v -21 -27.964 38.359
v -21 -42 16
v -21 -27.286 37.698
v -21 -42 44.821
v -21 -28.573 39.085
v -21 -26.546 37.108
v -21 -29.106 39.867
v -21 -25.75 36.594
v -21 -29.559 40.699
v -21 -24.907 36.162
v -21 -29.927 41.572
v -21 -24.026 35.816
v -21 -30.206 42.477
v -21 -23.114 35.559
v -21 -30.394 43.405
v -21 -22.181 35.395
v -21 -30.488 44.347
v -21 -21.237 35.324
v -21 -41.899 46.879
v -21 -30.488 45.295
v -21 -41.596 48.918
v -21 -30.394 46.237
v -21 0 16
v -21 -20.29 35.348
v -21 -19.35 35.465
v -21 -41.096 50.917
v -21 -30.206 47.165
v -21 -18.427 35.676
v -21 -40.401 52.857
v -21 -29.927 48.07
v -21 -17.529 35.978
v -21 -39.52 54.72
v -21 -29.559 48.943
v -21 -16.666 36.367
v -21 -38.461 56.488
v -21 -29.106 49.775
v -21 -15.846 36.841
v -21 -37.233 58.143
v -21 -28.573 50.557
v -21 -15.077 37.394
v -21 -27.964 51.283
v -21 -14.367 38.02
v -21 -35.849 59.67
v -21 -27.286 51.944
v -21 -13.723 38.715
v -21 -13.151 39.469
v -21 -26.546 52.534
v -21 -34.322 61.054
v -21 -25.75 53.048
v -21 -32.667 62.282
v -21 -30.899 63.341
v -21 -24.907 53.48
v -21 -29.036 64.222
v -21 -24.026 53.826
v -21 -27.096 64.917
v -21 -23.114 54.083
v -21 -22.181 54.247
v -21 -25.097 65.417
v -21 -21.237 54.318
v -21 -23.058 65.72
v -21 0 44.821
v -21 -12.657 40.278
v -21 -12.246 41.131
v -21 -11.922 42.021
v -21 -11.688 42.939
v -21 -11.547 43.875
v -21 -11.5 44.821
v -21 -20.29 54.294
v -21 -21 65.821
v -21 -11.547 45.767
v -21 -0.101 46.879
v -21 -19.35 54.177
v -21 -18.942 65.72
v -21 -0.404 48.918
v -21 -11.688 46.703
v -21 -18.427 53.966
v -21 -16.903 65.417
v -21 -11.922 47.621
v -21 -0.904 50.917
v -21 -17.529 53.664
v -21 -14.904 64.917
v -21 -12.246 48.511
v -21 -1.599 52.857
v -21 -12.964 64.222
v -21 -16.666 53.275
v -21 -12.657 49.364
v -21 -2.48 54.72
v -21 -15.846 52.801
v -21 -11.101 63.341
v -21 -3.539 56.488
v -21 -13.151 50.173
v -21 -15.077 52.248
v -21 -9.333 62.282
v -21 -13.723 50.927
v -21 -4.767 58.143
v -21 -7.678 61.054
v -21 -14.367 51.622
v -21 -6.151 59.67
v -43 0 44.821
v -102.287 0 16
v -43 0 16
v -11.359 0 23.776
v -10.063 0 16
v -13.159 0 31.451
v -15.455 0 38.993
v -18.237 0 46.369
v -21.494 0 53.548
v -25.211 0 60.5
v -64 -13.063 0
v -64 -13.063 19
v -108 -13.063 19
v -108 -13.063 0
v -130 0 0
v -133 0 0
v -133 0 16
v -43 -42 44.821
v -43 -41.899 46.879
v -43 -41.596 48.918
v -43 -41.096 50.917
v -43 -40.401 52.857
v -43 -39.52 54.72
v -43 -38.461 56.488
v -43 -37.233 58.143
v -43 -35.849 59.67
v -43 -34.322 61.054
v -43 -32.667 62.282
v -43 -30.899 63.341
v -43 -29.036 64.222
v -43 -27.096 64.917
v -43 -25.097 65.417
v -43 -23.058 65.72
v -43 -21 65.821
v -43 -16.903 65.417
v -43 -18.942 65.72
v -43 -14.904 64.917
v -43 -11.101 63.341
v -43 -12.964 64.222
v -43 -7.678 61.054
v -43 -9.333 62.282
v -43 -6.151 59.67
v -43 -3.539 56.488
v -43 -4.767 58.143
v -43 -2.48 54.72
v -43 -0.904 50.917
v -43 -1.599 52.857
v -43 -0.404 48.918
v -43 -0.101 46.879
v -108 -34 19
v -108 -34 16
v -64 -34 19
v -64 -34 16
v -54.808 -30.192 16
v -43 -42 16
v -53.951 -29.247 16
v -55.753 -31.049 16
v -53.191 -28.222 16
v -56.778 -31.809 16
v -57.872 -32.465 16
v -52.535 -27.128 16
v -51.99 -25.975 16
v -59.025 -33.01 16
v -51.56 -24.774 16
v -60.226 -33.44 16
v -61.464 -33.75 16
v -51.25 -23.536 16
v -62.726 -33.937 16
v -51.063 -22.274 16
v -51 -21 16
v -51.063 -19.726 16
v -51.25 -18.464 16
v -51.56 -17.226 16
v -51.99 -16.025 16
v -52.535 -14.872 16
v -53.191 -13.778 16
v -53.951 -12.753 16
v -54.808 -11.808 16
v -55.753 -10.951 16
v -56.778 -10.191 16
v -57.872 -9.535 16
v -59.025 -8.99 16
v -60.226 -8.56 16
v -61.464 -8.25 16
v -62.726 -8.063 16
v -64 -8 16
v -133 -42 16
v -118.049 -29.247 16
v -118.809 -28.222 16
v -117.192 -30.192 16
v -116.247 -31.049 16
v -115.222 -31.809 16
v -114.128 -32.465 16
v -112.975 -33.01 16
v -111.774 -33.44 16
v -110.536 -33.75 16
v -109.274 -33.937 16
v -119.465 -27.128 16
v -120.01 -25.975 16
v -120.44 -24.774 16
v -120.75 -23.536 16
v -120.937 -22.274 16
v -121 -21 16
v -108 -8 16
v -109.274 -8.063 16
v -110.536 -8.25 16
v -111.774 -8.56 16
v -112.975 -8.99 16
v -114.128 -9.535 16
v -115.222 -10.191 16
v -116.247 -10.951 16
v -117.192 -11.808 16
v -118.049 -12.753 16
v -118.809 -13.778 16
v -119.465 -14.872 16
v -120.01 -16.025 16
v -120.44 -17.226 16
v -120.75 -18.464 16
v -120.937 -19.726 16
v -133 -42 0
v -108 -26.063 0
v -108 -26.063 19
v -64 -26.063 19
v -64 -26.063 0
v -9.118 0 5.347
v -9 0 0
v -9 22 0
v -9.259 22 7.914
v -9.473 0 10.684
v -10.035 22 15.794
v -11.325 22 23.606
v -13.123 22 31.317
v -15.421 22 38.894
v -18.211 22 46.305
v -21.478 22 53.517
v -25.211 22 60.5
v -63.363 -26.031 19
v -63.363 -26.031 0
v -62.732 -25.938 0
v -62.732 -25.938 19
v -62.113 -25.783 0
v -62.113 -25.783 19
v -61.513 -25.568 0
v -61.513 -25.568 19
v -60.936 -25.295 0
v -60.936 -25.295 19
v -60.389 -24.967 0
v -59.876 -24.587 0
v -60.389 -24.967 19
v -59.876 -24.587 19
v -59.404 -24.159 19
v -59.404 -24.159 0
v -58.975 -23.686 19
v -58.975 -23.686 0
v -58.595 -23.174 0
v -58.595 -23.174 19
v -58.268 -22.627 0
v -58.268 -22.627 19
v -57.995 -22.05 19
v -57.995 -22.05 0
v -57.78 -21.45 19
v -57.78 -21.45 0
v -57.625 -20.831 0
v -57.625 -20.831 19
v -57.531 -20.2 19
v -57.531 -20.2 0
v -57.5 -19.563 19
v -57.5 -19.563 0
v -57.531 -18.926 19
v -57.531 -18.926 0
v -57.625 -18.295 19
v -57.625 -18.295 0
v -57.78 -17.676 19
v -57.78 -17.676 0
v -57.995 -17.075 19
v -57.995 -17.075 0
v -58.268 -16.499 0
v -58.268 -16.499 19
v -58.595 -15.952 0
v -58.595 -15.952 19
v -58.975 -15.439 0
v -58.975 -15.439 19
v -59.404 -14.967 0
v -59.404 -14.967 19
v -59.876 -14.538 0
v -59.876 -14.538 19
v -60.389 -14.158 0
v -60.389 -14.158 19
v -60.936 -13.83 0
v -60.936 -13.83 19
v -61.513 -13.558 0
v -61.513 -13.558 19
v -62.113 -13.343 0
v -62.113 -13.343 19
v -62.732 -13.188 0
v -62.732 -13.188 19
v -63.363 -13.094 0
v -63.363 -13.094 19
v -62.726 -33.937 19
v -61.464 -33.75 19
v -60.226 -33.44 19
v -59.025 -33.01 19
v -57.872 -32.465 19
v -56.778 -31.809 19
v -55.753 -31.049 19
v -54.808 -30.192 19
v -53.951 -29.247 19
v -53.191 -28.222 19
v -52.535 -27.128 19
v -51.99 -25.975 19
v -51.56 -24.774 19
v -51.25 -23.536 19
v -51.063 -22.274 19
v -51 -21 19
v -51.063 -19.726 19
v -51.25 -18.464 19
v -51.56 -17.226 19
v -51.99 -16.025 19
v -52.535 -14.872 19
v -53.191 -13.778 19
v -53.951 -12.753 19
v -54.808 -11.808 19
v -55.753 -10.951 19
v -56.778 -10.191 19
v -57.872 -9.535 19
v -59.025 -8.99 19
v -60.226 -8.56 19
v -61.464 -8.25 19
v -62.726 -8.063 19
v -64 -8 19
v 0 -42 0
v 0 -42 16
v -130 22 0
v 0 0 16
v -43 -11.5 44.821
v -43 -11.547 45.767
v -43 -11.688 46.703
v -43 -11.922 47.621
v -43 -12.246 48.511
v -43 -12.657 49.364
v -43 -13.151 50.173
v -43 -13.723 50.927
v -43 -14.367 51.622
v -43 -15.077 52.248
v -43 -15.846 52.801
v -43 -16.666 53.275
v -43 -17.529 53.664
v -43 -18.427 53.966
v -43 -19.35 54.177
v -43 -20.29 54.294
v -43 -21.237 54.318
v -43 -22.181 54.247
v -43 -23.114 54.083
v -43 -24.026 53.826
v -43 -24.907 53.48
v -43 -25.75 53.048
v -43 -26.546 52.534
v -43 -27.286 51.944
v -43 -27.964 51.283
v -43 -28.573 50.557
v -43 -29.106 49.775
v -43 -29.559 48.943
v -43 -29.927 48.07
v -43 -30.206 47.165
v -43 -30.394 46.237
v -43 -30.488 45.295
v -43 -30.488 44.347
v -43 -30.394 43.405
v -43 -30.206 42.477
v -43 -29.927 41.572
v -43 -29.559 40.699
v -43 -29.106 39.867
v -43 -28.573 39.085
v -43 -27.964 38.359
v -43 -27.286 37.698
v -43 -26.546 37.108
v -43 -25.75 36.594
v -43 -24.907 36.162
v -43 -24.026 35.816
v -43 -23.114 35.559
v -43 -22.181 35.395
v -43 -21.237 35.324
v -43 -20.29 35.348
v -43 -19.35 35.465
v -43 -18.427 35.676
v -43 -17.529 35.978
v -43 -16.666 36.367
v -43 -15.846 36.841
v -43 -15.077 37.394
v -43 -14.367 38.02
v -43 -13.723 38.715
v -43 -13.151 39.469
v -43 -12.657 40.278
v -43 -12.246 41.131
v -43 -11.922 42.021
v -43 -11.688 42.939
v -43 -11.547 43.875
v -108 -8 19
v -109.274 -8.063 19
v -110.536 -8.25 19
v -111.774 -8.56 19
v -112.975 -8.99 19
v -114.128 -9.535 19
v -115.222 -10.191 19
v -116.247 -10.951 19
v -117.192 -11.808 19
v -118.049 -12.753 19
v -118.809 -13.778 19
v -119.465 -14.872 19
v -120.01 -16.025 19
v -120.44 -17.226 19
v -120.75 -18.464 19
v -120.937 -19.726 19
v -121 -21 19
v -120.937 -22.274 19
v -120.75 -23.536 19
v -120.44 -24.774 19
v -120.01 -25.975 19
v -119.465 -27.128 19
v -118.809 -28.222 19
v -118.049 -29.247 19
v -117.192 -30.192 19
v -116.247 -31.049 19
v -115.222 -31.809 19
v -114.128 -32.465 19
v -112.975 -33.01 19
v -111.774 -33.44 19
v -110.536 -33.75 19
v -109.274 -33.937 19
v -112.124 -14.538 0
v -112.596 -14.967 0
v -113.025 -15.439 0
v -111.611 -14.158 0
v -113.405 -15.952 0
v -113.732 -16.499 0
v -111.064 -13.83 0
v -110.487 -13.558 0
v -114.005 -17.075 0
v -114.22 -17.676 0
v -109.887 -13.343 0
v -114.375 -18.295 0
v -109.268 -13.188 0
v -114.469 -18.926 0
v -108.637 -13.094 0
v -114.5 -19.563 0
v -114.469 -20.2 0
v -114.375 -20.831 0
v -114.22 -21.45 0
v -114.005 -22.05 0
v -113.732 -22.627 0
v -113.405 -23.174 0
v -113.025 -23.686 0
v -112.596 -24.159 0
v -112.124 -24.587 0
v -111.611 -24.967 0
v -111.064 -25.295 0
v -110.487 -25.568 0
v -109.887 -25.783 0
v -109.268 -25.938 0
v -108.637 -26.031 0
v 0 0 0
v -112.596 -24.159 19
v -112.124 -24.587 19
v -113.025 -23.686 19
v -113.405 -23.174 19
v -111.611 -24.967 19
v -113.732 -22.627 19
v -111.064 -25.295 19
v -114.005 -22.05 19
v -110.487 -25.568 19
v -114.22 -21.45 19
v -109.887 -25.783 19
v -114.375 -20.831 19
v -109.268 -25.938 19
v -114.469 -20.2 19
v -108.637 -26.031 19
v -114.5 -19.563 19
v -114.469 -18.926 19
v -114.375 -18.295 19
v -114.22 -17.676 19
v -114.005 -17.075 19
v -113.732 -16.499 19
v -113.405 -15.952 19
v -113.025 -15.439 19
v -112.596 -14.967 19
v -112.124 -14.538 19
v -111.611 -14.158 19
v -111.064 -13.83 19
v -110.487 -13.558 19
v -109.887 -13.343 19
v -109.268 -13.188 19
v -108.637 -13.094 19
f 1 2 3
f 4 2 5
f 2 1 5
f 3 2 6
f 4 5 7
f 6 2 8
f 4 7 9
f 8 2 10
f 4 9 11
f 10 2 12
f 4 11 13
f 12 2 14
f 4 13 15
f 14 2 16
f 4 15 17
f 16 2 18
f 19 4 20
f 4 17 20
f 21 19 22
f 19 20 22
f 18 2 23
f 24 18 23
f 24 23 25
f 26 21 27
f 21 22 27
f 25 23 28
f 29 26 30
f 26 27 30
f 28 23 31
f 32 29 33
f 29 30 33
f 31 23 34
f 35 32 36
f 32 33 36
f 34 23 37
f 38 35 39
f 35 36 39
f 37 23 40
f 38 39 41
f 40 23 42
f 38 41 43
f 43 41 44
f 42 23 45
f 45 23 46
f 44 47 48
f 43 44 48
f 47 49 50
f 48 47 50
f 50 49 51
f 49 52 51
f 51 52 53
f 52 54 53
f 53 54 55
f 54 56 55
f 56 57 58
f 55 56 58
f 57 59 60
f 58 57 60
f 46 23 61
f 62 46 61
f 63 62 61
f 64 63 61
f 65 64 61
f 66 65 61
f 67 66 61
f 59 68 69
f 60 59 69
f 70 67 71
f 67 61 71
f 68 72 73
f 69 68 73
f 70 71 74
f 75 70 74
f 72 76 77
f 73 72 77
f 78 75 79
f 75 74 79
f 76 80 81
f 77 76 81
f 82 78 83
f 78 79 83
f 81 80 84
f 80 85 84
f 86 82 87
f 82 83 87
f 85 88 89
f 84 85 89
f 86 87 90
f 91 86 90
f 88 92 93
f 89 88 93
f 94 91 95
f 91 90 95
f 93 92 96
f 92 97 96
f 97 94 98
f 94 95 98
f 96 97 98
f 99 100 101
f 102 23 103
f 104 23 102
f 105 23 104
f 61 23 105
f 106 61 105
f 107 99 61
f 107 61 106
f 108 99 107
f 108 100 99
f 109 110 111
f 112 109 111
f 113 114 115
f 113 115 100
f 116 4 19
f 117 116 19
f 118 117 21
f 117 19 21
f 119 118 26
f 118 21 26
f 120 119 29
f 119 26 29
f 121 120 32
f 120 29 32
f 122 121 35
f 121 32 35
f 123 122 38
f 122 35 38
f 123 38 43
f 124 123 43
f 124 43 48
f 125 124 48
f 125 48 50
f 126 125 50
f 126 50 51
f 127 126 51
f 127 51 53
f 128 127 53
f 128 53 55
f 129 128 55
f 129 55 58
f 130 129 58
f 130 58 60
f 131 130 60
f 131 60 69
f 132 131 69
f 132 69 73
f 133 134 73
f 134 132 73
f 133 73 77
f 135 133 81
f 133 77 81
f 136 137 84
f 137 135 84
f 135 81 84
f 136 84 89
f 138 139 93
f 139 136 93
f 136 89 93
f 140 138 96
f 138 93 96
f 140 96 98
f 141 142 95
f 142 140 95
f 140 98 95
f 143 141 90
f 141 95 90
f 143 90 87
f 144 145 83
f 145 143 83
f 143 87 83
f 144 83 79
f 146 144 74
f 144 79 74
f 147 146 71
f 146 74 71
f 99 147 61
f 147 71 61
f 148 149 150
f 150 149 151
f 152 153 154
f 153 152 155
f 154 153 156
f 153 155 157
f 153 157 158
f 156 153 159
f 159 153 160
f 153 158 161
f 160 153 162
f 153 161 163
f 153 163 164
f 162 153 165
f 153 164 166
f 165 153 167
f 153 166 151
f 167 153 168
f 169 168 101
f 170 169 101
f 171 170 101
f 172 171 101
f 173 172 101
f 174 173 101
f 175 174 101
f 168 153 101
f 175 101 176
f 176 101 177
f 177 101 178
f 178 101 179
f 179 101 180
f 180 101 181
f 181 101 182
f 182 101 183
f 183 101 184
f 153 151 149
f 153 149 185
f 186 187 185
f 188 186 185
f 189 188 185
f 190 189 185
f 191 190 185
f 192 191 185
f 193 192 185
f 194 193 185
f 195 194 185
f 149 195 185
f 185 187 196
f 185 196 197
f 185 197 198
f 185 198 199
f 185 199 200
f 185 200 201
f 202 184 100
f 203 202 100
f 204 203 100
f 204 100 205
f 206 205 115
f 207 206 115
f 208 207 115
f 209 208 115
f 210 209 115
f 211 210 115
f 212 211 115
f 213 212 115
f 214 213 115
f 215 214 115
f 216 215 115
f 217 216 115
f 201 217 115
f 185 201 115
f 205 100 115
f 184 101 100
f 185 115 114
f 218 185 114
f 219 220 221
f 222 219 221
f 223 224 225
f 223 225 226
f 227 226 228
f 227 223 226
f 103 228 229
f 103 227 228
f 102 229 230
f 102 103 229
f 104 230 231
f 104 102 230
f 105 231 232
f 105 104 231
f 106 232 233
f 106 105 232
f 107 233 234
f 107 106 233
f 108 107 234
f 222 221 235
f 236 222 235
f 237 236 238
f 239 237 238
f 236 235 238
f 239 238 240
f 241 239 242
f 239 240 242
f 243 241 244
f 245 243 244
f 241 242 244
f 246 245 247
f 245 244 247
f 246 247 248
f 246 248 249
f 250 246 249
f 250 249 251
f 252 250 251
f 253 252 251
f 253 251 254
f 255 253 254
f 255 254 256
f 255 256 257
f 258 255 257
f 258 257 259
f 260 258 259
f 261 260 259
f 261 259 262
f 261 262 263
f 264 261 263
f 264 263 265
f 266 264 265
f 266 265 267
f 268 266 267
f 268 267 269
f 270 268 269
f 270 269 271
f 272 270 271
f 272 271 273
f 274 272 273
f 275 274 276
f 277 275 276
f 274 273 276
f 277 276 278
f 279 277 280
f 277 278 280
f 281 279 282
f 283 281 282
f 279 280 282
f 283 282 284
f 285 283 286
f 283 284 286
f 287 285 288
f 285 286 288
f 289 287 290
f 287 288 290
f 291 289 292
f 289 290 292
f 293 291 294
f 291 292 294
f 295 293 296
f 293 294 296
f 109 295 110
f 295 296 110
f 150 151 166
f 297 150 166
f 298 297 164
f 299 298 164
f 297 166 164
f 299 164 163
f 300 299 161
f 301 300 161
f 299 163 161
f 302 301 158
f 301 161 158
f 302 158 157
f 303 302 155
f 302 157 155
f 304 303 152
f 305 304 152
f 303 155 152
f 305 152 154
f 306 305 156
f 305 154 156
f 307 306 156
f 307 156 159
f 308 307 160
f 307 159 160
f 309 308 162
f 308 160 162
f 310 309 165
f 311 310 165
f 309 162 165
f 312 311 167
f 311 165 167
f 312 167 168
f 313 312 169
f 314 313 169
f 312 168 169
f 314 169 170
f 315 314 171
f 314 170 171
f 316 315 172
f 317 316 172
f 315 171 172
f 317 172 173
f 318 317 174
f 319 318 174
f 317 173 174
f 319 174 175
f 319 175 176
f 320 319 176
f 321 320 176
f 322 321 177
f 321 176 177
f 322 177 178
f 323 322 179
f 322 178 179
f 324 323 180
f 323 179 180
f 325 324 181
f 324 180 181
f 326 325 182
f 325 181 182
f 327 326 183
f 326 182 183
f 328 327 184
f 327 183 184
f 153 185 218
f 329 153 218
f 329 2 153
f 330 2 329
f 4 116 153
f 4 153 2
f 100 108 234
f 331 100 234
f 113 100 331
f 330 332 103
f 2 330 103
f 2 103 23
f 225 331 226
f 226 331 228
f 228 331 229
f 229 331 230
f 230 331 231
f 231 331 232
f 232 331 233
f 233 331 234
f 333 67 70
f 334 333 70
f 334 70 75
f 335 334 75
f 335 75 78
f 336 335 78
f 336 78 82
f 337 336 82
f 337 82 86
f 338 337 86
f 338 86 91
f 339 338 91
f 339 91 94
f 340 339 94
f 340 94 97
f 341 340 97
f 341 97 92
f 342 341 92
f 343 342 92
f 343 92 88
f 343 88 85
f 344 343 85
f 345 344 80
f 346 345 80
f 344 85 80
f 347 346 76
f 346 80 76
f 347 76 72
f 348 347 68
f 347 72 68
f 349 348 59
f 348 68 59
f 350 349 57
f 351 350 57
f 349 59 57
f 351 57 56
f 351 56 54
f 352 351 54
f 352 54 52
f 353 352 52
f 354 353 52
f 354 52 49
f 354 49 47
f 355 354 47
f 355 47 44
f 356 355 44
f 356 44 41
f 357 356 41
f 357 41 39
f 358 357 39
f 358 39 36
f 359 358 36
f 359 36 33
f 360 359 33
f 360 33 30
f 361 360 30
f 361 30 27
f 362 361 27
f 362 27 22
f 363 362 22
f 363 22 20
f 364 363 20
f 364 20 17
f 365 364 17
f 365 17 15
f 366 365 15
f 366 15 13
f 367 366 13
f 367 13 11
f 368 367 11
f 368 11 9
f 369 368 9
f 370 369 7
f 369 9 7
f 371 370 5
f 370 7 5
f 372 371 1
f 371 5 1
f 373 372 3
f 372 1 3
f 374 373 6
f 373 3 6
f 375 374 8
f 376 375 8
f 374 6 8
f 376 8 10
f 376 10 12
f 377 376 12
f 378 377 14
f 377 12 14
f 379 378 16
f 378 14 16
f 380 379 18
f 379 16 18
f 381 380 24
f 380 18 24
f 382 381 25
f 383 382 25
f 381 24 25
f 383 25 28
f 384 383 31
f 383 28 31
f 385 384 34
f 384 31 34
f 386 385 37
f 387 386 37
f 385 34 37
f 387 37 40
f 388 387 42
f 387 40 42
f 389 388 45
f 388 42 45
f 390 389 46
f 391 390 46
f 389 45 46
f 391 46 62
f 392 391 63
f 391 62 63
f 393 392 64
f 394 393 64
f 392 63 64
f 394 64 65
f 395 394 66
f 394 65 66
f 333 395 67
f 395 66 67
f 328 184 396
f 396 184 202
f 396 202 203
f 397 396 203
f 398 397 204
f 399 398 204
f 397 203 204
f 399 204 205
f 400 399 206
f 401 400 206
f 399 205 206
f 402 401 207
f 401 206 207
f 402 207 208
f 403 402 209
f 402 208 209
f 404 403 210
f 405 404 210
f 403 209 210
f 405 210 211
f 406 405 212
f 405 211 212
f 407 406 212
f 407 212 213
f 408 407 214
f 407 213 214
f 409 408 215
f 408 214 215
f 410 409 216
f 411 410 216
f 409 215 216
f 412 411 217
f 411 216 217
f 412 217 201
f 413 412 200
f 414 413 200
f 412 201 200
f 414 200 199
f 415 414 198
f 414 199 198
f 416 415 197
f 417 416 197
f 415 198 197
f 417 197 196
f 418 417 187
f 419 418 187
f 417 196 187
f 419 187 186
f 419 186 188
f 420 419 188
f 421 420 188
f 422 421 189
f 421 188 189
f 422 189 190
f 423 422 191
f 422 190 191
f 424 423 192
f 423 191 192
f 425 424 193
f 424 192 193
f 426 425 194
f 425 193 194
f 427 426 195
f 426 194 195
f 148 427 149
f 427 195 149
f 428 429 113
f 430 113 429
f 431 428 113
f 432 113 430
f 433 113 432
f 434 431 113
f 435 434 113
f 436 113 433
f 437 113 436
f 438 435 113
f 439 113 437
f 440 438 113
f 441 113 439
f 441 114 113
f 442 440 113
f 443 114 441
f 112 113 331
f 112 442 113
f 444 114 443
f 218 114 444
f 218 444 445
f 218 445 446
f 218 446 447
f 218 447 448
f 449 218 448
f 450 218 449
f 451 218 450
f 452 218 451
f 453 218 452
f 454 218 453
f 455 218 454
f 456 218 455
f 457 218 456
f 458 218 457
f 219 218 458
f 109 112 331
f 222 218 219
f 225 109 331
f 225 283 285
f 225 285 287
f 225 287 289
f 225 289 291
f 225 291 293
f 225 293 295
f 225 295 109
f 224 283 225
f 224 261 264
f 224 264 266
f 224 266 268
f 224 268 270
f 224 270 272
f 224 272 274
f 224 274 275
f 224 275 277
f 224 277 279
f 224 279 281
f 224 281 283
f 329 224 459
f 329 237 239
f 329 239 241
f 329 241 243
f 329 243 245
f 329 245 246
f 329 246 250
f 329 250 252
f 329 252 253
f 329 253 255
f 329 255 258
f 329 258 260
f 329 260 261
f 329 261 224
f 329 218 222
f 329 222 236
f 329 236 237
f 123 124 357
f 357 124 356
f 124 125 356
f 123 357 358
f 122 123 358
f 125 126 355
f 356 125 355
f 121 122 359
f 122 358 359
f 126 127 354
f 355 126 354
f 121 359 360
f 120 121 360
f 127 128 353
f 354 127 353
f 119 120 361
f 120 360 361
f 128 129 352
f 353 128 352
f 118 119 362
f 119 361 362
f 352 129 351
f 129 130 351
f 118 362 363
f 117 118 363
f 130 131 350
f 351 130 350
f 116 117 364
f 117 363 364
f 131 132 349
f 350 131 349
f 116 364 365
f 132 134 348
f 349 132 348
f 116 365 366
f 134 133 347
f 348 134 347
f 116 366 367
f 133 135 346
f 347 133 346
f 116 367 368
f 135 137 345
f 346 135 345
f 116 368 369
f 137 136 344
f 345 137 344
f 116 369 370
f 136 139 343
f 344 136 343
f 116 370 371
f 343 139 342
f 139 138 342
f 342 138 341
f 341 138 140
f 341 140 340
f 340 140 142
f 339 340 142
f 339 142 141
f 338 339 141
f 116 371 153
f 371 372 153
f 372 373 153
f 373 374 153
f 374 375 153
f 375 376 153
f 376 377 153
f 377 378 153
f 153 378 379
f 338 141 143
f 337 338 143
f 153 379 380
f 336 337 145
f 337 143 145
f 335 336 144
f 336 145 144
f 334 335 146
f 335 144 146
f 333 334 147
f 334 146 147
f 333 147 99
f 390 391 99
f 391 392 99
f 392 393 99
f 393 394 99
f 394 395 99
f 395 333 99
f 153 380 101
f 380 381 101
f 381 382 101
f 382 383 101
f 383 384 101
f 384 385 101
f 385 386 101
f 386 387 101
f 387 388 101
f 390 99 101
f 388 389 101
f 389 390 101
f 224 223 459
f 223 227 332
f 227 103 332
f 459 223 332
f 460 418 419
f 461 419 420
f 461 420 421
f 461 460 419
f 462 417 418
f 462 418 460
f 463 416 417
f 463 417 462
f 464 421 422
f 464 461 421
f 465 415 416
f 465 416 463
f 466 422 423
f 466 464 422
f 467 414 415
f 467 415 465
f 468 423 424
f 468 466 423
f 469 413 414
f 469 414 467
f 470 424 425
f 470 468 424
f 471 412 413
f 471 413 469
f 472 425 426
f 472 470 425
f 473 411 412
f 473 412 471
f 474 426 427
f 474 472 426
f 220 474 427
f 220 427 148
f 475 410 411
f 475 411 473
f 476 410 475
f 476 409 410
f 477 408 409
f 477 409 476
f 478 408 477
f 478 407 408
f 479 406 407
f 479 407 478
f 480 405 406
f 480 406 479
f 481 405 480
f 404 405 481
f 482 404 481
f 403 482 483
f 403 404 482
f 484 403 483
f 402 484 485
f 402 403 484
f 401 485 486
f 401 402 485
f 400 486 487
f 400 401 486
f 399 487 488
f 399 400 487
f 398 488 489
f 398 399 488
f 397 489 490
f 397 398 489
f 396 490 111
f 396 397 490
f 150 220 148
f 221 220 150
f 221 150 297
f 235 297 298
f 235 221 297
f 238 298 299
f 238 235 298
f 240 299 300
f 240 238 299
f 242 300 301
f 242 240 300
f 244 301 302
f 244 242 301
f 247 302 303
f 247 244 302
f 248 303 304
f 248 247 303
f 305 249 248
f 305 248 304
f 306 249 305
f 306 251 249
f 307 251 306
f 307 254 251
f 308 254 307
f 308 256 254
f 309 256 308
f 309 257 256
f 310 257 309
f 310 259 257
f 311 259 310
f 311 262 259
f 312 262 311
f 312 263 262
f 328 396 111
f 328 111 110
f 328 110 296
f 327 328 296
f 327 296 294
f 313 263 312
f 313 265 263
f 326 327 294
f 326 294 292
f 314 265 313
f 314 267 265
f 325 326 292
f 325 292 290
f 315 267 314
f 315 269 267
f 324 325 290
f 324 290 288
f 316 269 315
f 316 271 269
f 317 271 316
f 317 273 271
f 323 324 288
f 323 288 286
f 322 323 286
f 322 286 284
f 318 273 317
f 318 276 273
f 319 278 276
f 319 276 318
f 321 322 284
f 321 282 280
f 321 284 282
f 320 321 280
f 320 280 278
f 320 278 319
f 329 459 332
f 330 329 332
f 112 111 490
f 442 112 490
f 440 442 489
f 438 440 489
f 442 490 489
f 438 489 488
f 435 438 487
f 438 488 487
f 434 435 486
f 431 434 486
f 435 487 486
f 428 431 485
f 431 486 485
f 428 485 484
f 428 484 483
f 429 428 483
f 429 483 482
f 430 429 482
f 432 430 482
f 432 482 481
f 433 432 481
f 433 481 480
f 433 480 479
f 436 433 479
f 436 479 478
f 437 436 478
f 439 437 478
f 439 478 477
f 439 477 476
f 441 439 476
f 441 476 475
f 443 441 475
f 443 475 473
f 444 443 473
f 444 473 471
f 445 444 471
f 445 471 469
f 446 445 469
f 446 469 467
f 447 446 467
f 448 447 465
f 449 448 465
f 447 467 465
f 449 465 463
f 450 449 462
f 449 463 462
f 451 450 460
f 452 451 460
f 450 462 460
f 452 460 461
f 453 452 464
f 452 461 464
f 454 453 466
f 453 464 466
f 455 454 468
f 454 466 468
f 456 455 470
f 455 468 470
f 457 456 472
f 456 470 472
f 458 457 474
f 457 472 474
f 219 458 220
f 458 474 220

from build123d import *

# Parameters (mm, degrees)
F1_DEPTH  = 42
F3_DEPTH  = 112.001
F2_R      = 9.5
F4_DEPTH  = 112.001
F6_DEPTH  = 3
F8_DEPTH  = 22
F10_DEPTH = 19.001


with BuildPart() as f1:
    # F0 (on Front) → F1 (new body)
    with BuildSketch(Plane.XZ):
        Polygon((-133, 0), (0, 0), (0, 16), (-21, 16), (-21, 66), (-43, 66), (-43, 16), (-133, 16), align=None)
    extrude(amount=F1_DEPTH)

    # F2 (on face) → F3 (cut, through all)
    with BuildSketch(Plane.YZ.offset(-21)):
        with BuildLine():
            Line((-42, 66), (-42, 44.820994))
            ThreePointArc((-42, 44.820994), (-21, 65.820994), (0, 44.820994))
            Line((0, 44.820994), (0, 66))
            Line((0, 66), (-42, 66))
        make_face()
    extrude(amount=-F3_DEPTH, mode=Mode.SUBTRACT)

    # F2 (on face) → F4 (cut, through all)
    with BuildSketch(Plane.YZ.offset(-21)):
        with Locations((-21, 44.820994)):
            Circle(F2_R)
    extrude(amount=-F4_DEPTH, mode=Mode.SUBTRACT)

    # F5 (on face) → F6 (join)
    with BuildSketch(Plane.XY.offset(16)):
        with BuildLine():
            Line((-64, -8), (-108, -8))
            ThreePointArc((-108, -8), (-121, -21), (-108, -34))
            Line((-108, -34), (-64, -34))
            ThreePointArc((-64, -34), (-51, -21), (-64, -8))
        make_face()
    extrude(amount=F6_DEPTH)

    # F7 (on Front) → F8 (join)
    with BuildSketch(Plane.XZ):
        with BuildLine():
            Line((-130, 0), (-9, 0))
            ThreePointArc((-9, 0), (-13.122975, 31.317104), (-25.210926, 60.5))
            Line((-25.210926, 60.5), (-130, 0))
        make_face()
    extrude(amount=-F8_DEPTH)

    # F9 (on face) → F10 (cut, through all)
    with BuildSketch(Plane.XY.offset(19)):
        with BuildLine():
            Line((-64, -13.062797), (-108, -13.062797))
            ThreePointArc((-108, -13.062797), (-114.5, -19.562797), (-108, -26.062797))
            Line((-108, -26.062797), (-64, -26.062797))
            ThreePointArc((-64, -26.062797), (-57.5, -19.562797), (-64, -13.062797))
        make_face()
    extrude(amount=-F10_DEPTH, mode=Mode.SUBTRACT)


solid = f1.part
